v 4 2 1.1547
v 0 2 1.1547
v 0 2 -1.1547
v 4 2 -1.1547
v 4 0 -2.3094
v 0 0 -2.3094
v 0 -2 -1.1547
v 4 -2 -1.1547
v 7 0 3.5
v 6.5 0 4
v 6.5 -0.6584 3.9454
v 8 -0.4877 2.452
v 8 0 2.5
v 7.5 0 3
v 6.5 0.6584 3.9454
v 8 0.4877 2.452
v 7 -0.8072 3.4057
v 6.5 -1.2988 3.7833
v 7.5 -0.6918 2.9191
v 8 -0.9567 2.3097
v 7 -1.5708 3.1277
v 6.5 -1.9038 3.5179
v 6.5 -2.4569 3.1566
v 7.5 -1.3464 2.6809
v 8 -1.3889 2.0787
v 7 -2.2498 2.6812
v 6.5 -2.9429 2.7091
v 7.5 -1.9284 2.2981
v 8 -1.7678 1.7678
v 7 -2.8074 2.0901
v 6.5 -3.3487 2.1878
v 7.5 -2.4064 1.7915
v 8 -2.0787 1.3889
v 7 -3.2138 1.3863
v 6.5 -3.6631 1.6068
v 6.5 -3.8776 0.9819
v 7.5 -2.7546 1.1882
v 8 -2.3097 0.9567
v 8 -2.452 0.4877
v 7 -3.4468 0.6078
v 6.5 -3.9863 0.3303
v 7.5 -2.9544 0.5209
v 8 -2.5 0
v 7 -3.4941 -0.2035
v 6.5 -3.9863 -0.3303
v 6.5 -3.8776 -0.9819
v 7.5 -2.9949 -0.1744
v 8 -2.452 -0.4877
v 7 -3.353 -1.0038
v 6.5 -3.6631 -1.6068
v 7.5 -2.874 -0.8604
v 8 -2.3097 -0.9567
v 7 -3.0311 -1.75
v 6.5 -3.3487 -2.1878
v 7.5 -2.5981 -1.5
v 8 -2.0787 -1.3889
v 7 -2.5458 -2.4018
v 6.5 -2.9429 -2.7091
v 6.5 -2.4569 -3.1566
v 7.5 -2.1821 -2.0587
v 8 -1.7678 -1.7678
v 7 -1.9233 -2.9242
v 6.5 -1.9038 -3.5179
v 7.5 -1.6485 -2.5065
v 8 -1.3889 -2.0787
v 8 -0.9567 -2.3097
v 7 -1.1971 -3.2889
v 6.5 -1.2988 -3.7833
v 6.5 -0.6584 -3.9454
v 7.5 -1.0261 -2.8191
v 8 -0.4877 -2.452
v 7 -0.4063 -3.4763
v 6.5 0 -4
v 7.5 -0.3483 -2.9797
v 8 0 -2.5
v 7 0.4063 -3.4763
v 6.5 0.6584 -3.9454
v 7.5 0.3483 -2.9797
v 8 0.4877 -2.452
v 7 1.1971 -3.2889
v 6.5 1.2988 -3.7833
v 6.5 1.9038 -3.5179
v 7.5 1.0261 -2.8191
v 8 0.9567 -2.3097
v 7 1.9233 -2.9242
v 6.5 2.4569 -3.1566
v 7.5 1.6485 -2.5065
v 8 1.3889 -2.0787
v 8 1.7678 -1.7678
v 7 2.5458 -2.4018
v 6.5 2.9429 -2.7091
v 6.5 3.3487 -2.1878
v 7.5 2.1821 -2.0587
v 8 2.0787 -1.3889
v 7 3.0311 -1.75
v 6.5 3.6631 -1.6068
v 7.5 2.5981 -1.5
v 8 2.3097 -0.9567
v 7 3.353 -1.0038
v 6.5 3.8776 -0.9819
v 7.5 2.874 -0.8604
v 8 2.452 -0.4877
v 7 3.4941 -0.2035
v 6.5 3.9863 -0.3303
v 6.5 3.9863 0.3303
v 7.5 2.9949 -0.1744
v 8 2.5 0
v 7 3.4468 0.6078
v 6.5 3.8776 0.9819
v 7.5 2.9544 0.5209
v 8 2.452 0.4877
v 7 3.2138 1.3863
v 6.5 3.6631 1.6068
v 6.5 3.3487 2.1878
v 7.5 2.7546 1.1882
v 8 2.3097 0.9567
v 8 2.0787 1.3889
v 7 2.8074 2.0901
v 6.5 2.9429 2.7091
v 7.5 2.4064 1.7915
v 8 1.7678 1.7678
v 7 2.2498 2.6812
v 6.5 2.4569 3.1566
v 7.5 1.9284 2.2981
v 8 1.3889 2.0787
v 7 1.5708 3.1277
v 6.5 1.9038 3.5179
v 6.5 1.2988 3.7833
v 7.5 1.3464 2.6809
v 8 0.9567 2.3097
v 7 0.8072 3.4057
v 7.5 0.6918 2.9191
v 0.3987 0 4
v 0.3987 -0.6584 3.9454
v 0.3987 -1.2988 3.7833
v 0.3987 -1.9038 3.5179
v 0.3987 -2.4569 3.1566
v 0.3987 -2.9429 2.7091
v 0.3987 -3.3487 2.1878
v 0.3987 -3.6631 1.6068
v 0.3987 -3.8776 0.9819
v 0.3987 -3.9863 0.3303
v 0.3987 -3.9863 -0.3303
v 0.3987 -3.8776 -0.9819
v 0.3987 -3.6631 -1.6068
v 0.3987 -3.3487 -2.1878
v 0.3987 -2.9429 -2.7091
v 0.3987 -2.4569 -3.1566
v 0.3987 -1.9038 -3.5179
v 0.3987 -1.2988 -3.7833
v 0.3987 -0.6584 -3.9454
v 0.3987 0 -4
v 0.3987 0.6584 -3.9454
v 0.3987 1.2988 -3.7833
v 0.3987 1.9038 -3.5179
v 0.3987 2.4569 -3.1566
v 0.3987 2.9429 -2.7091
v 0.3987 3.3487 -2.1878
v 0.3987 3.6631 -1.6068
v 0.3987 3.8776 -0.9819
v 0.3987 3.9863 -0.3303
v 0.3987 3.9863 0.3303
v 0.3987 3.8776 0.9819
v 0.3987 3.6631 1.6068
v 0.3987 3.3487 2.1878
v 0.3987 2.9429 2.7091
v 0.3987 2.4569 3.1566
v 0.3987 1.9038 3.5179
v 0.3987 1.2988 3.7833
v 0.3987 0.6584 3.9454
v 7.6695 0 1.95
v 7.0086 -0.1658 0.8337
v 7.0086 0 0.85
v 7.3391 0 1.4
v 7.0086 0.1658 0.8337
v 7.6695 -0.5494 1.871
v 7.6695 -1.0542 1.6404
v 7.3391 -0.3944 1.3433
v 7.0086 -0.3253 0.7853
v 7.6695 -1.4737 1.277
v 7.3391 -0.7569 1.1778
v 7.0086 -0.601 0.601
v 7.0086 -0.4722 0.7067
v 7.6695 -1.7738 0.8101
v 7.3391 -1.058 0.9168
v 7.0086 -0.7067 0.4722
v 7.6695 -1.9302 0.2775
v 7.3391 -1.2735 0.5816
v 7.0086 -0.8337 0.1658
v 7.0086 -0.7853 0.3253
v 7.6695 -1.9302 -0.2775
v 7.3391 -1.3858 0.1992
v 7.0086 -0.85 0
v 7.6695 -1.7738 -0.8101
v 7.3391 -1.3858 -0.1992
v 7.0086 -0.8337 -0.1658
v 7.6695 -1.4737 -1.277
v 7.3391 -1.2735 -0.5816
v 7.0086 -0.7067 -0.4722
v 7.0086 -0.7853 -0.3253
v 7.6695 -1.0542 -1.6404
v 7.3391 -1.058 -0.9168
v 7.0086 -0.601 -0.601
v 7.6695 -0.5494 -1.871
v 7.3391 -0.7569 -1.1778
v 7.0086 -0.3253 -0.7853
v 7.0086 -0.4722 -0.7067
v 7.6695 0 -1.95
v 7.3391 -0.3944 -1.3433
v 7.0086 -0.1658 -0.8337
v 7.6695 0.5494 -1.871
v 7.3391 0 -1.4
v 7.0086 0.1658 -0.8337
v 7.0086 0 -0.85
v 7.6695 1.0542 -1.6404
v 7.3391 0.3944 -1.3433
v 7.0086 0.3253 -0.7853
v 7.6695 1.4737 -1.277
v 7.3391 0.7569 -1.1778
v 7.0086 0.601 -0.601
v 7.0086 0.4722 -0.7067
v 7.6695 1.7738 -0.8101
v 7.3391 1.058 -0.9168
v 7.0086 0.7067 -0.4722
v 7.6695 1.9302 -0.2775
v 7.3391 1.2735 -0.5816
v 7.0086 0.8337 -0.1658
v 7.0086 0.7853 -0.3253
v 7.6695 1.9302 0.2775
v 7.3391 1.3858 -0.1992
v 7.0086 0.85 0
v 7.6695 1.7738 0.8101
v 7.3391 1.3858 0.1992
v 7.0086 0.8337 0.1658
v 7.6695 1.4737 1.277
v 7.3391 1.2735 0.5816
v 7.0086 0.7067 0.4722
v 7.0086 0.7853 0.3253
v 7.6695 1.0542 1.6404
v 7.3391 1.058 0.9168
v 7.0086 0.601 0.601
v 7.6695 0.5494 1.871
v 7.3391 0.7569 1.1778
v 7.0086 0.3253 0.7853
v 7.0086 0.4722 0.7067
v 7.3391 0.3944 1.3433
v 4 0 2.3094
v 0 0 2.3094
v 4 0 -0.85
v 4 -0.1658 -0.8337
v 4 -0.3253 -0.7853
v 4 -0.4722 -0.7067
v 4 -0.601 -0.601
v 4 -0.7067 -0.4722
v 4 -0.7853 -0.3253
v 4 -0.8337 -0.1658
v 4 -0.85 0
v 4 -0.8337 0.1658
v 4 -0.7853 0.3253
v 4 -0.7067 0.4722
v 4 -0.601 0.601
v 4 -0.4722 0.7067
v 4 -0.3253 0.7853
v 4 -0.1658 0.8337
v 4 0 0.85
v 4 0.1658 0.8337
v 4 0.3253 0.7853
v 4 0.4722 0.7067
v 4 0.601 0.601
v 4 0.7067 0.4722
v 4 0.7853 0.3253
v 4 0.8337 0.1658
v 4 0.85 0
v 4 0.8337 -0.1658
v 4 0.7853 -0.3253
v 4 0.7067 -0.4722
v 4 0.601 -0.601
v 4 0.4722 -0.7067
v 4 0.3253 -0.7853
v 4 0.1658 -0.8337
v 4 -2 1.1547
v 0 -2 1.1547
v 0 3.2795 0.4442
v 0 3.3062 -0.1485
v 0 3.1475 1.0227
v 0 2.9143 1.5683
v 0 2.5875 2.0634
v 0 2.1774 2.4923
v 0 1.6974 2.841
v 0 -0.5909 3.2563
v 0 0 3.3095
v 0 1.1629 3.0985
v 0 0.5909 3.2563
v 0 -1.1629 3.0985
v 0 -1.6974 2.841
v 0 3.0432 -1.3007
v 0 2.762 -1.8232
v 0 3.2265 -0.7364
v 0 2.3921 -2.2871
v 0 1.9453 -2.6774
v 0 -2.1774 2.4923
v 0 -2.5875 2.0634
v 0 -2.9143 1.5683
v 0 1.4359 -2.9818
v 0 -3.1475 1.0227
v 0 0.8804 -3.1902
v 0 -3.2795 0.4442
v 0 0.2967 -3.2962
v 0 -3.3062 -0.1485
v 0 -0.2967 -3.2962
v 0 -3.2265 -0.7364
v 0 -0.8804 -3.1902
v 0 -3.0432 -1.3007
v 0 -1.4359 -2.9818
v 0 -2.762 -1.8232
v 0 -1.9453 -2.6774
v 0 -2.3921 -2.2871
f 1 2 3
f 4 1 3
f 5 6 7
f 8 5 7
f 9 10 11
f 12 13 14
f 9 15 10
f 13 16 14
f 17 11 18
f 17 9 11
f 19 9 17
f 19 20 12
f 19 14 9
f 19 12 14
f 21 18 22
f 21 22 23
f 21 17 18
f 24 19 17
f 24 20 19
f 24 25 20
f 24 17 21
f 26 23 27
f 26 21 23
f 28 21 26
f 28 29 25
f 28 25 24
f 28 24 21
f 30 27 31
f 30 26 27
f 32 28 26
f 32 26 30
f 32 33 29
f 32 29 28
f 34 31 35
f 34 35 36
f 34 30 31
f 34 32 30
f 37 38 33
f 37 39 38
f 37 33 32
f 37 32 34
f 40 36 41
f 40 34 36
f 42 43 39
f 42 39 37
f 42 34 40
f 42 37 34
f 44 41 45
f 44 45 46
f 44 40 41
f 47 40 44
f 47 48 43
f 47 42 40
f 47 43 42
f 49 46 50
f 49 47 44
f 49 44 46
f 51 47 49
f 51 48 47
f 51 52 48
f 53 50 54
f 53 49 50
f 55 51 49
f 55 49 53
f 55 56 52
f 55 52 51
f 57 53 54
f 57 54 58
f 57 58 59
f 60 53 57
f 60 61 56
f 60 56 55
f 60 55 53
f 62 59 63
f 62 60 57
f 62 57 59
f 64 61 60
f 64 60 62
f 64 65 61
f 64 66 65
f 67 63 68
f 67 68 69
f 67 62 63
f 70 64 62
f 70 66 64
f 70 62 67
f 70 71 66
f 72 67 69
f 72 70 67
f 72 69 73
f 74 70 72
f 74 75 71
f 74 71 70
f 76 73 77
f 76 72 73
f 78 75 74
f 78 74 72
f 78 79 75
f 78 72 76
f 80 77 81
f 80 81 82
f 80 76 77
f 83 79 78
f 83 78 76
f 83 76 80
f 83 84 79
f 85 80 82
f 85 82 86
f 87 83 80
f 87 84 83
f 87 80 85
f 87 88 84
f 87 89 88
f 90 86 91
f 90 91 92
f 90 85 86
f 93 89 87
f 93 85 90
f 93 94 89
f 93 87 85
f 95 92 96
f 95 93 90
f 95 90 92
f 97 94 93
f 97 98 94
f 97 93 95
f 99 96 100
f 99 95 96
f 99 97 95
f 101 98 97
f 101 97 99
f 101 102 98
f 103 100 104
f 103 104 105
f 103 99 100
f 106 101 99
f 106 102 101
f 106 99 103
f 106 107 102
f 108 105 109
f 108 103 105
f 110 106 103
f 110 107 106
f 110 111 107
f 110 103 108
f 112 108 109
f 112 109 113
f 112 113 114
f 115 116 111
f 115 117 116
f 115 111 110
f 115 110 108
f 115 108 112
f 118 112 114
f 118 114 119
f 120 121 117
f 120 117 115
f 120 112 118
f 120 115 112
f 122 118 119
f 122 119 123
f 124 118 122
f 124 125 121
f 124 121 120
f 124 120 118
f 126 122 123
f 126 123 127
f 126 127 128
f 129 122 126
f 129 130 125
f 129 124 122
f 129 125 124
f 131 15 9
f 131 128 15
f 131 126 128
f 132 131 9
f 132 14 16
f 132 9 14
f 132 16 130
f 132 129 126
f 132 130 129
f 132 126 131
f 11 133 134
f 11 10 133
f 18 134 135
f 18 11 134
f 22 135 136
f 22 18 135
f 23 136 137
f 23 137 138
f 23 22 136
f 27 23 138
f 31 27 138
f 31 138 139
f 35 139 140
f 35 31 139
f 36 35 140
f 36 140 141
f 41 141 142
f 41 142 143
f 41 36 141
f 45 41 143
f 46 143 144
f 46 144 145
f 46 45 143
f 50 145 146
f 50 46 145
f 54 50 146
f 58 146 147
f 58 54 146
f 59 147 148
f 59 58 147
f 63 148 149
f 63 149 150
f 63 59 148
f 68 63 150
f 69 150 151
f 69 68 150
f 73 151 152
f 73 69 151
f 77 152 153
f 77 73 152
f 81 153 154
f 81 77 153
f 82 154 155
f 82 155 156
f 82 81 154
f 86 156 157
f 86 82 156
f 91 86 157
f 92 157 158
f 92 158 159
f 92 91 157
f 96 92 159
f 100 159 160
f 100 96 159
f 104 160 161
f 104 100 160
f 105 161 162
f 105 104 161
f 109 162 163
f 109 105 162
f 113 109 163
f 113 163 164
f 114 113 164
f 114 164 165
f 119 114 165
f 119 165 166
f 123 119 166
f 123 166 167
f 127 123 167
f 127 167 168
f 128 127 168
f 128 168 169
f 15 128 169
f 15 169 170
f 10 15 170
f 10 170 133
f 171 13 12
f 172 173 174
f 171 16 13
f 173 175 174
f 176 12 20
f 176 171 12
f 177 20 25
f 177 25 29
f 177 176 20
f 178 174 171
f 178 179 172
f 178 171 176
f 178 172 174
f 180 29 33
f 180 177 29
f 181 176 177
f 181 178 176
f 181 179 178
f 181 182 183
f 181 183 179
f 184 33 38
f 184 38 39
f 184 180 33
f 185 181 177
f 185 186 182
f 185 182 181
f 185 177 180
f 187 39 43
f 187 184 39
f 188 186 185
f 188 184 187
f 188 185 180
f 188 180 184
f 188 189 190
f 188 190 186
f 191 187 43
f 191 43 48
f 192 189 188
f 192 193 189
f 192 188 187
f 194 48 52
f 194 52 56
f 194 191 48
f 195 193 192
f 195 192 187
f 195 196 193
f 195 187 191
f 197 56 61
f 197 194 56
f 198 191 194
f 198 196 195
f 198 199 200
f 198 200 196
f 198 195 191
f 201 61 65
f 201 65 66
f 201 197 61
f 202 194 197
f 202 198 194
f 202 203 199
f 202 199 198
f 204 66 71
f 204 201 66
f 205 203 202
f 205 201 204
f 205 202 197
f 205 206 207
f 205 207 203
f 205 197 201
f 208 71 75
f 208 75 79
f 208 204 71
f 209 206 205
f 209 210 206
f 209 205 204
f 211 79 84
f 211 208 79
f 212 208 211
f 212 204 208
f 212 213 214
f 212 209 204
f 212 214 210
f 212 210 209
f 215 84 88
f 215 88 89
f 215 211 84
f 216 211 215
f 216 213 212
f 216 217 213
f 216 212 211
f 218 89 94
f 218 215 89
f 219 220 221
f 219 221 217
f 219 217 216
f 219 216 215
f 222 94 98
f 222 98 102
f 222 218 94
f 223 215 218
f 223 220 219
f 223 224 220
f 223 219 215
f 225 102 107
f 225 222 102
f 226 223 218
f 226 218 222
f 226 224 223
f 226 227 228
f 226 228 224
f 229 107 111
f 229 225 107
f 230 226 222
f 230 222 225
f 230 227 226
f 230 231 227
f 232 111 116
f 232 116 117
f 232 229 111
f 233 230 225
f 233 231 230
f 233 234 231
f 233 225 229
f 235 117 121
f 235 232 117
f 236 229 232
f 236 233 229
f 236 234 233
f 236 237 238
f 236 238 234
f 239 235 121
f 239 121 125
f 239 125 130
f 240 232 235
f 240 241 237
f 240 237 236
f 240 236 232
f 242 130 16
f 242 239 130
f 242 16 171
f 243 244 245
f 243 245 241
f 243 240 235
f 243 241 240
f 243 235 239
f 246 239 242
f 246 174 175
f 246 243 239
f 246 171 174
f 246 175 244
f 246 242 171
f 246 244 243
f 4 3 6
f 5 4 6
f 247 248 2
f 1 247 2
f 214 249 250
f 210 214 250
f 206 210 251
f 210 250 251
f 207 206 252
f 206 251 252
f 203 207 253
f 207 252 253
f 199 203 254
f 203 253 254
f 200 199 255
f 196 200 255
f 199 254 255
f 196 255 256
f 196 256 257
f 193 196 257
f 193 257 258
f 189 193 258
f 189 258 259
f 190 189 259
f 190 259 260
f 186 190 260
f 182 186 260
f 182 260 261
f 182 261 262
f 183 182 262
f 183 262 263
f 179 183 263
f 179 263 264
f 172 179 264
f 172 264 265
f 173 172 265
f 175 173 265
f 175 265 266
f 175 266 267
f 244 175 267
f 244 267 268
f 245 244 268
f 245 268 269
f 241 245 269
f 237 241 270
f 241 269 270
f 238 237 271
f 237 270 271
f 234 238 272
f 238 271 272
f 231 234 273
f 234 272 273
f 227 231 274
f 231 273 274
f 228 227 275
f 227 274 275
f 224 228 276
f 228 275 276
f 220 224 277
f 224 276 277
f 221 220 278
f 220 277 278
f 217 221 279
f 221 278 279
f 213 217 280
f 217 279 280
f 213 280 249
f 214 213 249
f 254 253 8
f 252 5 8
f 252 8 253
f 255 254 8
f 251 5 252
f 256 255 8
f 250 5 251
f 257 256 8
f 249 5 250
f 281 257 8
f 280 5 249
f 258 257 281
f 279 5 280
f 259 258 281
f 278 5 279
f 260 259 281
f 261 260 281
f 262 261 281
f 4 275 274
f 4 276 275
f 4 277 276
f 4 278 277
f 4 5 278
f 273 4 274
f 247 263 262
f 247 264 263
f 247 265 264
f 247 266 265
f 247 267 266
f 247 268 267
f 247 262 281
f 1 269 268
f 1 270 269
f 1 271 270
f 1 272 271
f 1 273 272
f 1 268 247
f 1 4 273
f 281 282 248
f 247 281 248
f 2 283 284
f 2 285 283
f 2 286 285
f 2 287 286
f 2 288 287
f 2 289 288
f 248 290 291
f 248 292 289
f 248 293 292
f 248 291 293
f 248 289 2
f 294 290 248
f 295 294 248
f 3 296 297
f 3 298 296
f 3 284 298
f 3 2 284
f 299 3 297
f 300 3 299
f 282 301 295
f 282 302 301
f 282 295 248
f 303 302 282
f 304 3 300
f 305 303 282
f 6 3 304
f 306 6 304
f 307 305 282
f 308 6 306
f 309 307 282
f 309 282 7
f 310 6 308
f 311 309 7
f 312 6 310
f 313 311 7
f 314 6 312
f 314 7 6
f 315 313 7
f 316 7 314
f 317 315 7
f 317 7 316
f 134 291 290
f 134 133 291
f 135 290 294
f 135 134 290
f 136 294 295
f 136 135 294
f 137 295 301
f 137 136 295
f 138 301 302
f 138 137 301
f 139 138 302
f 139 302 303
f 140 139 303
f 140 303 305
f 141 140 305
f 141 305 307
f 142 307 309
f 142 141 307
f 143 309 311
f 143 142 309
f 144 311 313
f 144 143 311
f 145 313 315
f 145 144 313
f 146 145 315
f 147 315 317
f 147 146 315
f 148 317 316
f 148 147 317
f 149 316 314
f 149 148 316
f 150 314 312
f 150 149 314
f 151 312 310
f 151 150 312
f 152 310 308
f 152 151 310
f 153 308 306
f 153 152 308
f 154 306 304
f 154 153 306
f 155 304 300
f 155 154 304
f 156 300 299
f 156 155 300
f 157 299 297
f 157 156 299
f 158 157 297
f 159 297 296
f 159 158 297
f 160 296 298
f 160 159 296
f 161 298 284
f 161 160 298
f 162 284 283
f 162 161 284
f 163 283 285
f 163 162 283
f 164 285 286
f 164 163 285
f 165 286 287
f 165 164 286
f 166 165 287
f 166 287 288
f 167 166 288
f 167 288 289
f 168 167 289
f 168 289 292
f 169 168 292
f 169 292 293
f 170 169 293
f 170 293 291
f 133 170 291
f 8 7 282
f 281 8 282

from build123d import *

# Parameters (mm, degrees)
HEX_2_DEPTH        = 4
SKETCH6_R          = 0.85
CUT_EXTRUDE1_DEPTH = 10.797958971


with BuildPart() as part:
    # BodySke → BaseBody (revolve)
    with BuildSketch(Plane.XY, mode=Mode.PRIVATE) as basebody_sk:
        Polygon((0, 0), (0, 3.3095), (0.398660361, 4), (6.5, 4), (8, 2.5), (6.497848452, 0), align=None)
    revolve(basebody_sk.sketch.rotate(Axis((-12.7, 0, 0), (1, 0, 0)), 90), axis=Axis((-12.7, 0, 0), (1, 0, 0)))

    # Sketch2 → Hex 2 (cut)
    with BuildSketch(Plane.ZY):
        Polygon((1.154700538, 2), (-1.154700538, 2), (-2.309401077, 0), (-1.154700538, -2), (1.154700538, -2), (2.309401077, 0), align=None)
    extrude(amount=-HEX_2_DEPTH, mode=Mode.SUBTRACT)

    # Sketch6 → Cut-Extrude1 (cut, through all)
    with BuildSketch(Plane.ZY):
        with Locations(Location((0, 0, 0), (0, 0, 180))):
            Circle(SKETCH6_R)
    extrude(amount=-CUT_EXTRUDE1_DEPTH, mode=Mode.SUBTRACT)


solid = part.part
